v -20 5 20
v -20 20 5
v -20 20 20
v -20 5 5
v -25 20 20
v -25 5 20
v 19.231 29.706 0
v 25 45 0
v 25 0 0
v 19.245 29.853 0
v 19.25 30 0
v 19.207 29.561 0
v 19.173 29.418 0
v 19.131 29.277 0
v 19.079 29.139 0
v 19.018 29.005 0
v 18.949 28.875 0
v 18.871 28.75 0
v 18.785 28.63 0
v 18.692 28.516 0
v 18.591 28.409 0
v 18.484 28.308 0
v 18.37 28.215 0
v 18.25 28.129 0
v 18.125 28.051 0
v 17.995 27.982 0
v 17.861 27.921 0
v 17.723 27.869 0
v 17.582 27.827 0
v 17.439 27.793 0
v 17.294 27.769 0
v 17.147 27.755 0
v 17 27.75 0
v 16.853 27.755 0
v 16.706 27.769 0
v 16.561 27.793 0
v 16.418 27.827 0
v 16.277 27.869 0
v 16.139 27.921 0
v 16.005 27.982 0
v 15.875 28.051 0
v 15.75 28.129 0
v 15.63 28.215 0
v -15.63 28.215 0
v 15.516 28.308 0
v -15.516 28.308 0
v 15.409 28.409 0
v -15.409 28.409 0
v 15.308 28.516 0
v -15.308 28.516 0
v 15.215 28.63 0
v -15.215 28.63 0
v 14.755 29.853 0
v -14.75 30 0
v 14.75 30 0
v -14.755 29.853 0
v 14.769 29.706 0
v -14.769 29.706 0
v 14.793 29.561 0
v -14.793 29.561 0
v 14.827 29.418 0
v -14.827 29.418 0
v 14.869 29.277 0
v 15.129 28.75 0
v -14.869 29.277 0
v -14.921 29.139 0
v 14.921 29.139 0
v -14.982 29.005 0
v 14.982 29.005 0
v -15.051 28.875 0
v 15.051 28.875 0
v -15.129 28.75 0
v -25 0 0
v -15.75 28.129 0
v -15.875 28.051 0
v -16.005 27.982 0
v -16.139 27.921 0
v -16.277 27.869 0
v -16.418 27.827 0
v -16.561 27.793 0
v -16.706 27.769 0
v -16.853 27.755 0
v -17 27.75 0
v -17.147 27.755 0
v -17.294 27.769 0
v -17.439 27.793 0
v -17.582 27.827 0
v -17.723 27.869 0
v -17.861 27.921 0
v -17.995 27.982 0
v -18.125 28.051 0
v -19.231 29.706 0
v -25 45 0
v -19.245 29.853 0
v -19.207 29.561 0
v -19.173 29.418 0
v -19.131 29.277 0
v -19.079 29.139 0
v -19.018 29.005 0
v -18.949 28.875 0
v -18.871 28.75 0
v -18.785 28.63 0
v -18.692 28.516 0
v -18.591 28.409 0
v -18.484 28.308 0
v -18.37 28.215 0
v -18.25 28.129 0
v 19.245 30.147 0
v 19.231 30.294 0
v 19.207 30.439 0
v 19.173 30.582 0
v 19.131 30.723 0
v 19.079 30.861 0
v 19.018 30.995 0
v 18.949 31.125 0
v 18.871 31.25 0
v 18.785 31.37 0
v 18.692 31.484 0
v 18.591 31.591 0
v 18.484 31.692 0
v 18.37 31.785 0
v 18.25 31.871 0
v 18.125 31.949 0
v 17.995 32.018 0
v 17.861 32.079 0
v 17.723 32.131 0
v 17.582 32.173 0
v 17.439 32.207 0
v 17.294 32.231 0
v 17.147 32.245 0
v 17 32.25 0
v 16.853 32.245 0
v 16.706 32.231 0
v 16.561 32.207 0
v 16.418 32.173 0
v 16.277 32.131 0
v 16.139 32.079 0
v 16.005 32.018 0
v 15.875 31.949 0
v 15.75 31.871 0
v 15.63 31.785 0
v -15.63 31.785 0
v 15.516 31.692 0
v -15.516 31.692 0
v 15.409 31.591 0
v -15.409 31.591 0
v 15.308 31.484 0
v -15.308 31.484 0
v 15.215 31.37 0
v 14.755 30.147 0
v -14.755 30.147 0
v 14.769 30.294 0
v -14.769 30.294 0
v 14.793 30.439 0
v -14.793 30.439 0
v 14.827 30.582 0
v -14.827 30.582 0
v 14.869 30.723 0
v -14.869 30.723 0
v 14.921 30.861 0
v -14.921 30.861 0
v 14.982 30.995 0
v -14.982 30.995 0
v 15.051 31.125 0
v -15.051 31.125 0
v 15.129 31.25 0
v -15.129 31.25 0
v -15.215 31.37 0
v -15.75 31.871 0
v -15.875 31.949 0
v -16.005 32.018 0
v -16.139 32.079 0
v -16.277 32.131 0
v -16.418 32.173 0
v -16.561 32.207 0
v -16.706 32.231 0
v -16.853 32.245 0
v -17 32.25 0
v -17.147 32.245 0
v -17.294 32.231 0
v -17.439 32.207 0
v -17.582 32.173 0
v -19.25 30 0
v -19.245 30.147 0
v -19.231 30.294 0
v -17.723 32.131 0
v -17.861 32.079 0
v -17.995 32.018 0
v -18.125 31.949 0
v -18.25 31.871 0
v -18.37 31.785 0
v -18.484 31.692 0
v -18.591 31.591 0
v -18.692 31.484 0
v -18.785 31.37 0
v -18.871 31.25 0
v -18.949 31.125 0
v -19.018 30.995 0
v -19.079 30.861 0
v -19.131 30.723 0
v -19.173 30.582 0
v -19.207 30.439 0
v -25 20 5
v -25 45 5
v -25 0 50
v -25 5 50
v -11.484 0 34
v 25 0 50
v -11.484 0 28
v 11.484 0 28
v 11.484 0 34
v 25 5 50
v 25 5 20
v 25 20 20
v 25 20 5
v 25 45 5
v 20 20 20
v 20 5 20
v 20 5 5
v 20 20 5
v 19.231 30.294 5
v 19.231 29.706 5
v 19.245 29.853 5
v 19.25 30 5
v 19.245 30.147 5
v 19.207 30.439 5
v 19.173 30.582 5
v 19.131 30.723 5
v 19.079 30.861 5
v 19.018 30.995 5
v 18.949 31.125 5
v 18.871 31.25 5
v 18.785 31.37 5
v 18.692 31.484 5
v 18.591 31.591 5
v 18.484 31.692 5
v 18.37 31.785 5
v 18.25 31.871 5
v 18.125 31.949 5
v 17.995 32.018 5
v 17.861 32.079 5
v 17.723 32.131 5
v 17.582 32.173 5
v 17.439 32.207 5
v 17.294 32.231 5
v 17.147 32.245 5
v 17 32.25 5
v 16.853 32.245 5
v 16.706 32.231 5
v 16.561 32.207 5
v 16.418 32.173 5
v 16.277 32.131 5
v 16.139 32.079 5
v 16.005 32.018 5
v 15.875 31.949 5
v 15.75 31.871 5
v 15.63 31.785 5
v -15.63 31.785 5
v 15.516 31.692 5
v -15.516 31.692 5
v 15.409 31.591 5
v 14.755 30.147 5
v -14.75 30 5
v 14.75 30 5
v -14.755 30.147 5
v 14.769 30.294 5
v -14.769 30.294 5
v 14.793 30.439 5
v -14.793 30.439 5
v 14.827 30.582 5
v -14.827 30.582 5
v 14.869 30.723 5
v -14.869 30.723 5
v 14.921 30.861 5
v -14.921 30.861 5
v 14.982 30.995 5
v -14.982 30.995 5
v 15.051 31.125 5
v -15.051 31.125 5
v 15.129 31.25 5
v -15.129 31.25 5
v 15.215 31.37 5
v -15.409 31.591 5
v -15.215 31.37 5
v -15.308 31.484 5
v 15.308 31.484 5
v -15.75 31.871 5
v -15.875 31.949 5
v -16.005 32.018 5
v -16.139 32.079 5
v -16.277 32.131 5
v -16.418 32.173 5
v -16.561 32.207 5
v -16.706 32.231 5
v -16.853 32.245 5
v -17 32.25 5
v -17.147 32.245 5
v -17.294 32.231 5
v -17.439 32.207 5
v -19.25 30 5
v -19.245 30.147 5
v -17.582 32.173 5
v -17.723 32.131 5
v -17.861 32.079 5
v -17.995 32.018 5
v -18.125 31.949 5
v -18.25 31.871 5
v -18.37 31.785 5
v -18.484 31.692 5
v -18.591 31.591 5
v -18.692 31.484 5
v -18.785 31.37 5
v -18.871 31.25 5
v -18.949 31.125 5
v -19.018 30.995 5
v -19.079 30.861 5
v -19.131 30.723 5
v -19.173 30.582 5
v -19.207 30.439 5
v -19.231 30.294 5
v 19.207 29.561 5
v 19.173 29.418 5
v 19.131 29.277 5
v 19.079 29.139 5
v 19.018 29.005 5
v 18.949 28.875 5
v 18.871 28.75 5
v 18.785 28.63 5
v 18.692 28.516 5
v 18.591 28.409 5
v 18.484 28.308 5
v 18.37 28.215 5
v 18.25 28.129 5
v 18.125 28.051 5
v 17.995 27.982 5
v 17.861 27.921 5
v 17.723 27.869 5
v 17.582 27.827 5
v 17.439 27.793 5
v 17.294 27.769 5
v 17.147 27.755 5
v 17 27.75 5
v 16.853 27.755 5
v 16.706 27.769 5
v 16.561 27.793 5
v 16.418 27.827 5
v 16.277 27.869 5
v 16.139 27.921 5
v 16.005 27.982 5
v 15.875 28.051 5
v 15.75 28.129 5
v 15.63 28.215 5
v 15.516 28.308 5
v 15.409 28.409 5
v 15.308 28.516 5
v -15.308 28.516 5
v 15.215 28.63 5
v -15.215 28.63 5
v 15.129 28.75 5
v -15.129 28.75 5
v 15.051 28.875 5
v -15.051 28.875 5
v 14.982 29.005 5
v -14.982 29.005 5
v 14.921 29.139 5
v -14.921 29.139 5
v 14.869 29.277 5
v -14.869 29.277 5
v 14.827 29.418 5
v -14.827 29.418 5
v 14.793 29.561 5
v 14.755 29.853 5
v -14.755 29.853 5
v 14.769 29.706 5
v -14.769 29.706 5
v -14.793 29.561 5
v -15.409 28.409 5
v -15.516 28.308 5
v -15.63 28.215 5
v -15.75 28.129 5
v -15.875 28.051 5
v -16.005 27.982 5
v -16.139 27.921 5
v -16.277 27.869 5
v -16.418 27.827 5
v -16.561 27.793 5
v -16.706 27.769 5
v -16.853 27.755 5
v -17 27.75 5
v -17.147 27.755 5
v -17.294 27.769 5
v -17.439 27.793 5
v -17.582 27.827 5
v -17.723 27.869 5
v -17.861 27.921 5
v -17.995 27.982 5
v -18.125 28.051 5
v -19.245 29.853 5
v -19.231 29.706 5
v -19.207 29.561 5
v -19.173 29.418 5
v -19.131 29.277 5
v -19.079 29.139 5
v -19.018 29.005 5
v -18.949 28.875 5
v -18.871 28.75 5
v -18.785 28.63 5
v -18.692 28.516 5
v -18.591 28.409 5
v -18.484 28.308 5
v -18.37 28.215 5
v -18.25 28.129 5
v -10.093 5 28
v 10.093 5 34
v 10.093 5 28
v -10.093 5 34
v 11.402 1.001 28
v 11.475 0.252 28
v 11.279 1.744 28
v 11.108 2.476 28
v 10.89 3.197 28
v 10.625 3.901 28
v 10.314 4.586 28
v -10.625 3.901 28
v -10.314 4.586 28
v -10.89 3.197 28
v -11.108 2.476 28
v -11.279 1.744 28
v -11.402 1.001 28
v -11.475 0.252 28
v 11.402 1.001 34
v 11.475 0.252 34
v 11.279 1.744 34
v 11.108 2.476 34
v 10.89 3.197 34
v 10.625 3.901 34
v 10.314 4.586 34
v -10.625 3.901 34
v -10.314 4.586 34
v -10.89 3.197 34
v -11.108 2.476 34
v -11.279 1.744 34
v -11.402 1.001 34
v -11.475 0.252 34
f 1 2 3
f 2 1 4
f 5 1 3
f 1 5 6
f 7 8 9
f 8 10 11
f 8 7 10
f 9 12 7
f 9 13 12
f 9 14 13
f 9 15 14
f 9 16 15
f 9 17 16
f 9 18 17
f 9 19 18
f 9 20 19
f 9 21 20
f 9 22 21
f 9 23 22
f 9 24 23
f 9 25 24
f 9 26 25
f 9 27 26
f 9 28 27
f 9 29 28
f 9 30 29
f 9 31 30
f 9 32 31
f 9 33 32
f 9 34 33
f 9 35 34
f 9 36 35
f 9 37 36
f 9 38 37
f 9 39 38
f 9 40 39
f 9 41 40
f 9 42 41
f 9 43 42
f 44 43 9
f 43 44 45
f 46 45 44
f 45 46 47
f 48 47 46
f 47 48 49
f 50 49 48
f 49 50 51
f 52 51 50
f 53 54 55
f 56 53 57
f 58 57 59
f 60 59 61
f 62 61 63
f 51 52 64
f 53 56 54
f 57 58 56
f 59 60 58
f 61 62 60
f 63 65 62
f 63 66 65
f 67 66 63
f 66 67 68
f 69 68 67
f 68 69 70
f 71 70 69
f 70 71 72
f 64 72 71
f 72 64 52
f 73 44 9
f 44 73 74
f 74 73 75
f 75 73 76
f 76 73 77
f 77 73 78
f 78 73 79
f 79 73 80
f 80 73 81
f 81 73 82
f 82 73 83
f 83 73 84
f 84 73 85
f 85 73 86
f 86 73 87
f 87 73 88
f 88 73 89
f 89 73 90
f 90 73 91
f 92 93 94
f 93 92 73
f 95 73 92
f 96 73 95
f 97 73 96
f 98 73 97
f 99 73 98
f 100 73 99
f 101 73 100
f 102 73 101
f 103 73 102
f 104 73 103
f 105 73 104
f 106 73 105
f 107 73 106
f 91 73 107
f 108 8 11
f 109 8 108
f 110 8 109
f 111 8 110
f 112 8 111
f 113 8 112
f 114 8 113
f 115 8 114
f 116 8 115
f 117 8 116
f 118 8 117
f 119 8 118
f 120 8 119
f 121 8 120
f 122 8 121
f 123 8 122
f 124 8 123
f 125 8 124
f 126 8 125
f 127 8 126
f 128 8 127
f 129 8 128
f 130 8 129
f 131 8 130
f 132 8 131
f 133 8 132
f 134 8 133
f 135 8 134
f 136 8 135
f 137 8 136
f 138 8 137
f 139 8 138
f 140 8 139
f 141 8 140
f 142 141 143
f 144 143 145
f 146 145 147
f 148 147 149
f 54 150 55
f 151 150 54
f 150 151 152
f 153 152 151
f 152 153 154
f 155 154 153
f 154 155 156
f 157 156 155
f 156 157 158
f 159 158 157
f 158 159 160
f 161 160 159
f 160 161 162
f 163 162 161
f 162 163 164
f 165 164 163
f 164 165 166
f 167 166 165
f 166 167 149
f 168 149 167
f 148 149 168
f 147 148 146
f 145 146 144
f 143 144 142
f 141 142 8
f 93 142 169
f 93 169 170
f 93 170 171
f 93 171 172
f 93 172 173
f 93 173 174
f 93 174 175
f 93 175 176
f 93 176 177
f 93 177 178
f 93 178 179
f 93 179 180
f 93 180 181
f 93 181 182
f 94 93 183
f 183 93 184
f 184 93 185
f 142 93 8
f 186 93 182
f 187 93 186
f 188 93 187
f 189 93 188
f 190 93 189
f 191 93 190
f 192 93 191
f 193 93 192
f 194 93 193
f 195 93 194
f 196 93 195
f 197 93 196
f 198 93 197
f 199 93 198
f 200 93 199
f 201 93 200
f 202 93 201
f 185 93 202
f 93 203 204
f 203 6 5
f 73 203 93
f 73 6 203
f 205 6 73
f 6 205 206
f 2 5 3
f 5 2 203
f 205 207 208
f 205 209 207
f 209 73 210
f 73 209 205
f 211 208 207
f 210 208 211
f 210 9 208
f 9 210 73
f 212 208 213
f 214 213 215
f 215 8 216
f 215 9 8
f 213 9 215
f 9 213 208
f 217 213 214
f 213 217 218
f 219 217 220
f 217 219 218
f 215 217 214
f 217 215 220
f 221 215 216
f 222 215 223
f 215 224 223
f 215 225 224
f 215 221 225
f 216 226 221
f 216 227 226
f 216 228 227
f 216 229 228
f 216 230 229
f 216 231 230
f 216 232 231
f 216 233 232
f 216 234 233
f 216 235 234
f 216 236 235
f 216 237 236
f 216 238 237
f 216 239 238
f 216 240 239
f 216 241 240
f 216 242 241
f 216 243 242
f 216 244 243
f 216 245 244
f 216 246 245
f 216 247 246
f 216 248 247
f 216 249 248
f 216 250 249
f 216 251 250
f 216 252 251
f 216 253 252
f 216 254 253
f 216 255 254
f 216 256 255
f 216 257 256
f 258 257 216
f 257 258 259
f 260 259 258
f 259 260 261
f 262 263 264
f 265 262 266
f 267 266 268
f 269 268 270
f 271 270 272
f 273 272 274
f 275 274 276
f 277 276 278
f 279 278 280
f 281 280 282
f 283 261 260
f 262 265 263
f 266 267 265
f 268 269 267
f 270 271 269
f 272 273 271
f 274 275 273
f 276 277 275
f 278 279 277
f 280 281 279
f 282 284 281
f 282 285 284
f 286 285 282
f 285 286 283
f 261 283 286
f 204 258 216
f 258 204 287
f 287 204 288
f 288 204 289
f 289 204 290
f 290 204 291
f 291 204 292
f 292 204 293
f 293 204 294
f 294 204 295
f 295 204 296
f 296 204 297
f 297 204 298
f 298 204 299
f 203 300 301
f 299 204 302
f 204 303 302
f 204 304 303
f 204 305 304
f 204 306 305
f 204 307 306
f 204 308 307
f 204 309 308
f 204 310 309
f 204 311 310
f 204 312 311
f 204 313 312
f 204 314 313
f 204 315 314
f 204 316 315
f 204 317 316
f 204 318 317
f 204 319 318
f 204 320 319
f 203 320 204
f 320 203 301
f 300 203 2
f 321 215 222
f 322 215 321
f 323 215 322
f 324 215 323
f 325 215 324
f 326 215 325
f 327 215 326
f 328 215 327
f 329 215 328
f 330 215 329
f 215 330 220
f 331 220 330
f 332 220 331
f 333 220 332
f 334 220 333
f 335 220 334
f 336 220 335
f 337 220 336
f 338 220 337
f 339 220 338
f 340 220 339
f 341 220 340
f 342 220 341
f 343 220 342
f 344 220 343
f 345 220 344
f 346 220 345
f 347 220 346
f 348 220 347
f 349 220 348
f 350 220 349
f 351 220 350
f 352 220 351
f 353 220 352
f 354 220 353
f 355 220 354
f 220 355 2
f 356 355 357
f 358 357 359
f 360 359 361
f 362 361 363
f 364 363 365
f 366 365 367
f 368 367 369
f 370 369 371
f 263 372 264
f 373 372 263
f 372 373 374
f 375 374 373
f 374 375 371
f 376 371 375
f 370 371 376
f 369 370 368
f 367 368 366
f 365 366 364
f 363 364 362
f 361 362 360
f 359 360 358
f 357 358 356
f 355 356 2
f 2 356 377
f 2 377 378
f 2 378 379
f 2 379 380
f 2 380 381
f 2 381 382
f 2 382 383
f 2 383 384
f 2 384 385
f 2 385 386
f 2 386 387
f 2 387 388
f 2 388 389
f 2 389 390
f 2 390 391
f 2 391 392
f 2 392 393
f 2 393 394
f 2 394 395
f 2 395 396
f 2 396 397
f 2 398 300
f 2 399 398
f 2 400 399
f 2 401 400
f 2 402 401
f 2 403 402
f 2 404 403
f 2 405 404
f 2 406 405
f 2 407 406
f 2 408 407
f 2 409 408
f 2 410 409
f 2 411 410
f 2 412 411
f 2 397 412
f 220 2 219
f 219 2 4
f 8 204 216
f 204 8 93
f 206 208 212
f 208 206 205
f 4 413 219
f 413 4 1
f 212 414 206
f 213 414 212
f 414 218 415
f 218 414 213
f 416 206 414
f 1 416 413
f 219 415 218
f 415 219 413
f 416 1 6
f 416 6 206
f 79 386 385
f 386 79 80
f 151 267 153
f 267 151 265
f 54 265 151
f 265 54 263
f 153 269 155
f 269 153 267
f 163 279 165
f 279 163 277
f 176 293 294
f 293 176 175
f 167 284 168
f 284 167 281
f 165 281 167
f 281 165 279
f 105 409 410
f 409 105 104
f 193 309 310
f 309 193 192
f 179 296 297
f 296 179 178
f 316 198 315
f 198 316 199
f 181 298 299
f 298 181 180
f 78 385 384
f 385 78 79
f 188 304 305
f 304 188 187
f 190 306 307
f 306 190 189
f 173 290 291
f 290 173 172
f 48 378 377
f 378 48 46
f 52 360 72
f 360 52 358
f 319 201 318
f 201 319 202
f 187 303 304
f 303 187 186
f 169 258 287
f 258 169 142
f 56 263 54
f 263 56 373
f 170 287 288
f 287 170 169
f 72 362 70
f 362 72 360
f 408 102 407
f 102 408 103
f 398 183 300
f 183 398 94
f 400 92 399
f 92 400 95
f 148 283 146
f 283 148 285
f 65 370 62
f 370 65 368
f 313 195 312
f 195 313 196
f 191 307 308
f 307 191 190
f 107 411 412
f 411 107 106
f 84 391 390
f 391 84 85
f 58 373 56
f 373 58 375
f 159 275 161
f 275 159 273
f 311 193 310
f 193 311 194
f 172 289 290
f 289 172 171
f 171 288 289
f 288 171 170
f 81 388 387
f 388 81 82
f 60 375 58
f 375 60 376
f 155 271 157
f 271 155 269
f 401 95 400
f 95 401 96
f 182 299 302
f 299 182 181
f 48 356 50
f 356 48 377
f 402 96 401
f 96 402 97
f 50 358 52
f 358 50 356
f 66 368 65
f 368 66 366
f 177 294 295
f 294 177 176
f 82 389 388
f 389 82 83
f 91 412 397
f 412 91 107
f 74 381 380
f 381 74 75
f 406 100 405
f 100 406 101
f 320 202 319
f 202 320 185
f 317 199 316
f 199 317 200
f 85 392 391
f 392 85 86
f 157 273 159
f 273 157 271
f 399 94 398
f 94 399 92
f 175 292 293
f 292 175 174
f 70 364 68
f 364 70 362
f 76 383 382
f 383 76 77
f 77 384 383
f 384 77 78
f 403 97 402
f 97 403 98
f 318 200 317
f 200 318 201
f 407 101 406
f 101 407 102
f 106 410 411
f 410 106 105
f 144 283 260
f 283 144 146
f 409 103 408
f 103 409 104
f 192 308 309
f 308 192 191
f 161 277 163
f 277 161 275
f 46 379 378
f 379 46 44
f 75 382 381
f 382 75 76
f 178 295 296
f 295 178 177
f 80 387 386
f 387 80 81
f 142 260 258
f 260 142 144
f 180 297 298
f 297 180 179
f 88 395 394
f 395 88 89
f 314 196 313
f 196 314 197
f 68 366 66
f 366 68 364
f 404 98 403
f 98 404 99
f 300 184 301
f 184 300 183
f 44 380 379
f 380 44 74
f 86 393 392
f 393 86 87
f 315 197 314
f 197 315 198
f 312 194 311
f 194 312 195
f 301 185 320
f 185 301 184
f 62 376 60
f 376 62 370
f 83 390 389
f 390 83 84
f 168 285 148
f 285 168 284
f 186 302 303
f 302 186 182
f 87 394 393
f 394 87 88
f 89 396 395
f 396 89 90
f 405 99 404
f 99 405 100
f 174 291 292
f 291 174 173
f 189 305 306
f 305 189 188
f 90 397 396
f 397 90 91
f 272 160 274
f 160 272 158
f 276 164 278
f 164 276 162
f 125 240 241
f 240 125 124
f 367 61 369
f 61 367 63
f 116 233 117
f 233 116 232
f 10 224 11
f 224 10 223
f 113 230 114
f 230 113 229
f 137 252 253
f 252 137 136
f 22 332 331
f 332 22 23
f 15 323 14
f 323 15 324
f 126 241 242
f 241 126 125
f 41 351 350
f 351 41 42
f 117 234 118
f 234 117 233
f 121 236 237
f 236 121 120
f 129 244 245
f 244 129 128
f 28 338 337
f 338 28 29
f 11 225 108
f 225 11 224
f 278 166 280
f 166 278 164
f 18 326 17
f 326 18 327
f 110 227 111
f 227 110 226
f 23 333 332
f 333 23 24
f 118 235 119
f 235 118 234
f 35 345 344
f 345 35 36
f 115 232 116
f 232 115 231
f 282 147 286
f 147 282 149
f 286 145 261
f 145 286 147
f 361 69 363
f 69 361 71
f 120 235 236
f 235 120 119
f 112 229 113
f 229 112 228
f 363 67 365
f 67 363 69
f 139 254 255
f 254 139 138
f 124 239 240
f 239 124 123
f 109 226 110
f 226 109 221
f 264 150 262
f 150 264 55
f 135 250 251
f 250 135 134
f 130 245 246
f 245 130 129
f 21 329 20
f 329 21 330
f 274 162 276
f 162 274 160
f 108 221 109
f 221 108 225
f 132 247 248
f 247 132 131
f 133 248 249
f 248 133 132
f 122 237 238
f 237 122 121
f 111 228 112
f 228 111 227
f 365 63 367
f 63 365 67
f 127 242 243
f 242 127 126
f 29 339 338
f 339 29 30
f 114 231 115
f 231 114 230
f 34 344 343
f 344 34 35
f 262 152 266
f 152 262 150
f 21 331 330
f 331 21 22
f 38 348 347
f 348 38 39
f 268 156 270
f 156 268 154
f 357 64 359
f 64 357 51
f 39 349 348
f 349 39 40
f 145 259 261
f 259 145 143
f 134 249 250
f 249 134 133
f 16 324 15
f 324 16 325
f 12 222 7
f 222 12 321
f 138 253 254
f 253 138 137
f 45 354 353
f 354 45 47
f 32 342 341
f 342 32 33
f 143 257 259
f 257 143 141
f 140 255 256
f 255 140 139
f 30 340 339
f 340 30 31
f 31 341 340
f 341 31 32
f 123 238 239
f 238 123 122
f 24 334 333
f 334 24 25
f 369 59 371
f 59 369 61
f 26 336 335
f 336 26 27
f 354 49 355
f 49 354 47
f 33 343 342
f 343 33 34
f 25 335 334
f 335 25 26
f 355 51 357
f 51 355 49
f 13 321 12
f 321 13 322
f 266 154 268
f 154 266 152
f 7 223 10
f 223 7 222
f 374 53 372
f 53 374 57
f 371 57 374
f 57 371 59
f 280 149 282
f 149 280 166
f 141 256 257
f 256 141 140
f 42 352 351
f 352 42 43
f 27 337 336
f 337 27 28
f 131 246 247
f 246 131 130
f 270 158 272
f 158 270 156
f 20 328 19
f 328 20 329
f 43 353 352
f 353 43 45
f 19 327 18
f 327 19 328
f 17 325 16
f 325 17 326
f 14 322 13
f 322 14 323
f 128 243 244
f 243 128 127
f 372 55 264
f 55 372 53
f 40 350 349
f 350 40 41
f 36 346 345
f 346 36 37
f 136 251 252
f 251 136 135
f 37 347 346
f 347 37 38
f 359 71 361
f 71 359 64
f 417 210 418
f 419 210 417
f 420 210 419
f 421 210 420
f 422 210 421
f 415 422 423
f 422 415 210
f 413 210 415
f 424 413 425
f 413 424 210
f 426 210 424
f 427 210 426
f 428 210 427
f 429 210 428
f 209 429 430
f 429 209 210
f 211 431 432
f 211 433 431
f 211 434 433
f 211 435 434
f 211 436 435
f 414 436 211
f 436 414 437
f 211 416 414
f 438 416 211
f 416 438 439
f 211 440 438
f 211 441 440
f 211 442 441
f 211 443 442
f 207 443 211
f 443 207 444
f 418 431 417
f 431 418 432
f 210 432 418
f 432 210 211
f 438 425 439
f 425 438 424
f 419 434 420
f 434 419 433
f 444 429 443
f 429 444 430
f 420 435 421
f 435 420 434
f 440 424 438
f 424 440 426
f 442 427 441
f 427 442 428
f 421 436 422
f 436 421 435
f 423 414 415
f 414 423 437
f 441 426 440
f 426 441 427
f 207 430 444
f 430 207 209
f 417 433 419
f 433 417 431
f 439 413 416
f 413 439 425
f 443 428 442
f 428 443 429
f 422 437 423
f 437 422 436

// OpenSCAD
// NEMA 17 stepper motor L-shaped mounting bracket
// Print orientation: base plate on the bed, vertical plate builds upward (+Z)

// ---------------- Parameters ----------------
plate_x      = 25;     // base plate half-length in X (total 50 mm)
plate_y      = 45;     // base plate length in Y
plate_t      = 5;      // base plate thickness in Z

hole_m4_x    = 17;     // M4 hole X offset from origin (+/-)
hole_m4_y    = 30;     // M4 hole Y position
hole_m4_d    = 4.5;    // M4 hole diameter

plate_z      = 50;     // vertical motor plate height in Z
plate_y2     = 5;      // vertical plate depth in Y

boss_d       = 23;     // motor centring boss hole diameter
boss_x       = 0;      // boss hole X centre
boss_z       = 28;     // boss hole Z centre

screw_d      = 3.4;    // M3 screw hole diameter
screw_pitch  = 31;     // M3 screw hole square pattern size

gusset_t     = 5;      // gusset thickness in X
gusset_y     = 20;     // gusset leg along +Y
gusset_z     = 20;     // gusset leg along +Z

eps          = 0.5;    // cutter overshoot past faces
$fn          = 96;     // curve resolution

// ---------------- Model ----------------
difference() {
    union() {
        // Base plate
        translate([-plate_x, 0, 0])
            cube([plate_x * 2, plate_y, plate_t]);

        // Vertical motor plate
        translate([-plate_x, 0, 0])
            cube([plate_x * 2, plate_y2, plate_z]);

        // Gussets, flush with left and right edges
        for (sx = [-1, 1])
            translate([sx > 0 ? plate_x - gusset_t : -plate_x, 0, 0])
                cube([gusset_t, gusset_y, gusset_z]);
    }

    // Through-holes
    // Two M4 vertical holes in base plate
    for (x = [-hole_m4_x, hole_m4_x])
        translate([x, hole_m4_y, -eps])
            cylinder(d = hole_m4_d, h = plate_t + 2 * eps);

    // Motor centring boss hole through vertical plate (along Y)
    translate([boss_x, -eps, boss_z])
        cylinder(d = boss_d, h = plate_y2 + 2 * eps);

    // Four M3 screw holes on a square pattern centred on the boss hole
    for (i = [0 : 3])
        rotate([0, 0, i * 90])
            translate([boss_x, plate_y2 / 2 - eps, boss_z])
                cylinder(d = screw_d, h = plate_y2 + 2 * eps);
}
